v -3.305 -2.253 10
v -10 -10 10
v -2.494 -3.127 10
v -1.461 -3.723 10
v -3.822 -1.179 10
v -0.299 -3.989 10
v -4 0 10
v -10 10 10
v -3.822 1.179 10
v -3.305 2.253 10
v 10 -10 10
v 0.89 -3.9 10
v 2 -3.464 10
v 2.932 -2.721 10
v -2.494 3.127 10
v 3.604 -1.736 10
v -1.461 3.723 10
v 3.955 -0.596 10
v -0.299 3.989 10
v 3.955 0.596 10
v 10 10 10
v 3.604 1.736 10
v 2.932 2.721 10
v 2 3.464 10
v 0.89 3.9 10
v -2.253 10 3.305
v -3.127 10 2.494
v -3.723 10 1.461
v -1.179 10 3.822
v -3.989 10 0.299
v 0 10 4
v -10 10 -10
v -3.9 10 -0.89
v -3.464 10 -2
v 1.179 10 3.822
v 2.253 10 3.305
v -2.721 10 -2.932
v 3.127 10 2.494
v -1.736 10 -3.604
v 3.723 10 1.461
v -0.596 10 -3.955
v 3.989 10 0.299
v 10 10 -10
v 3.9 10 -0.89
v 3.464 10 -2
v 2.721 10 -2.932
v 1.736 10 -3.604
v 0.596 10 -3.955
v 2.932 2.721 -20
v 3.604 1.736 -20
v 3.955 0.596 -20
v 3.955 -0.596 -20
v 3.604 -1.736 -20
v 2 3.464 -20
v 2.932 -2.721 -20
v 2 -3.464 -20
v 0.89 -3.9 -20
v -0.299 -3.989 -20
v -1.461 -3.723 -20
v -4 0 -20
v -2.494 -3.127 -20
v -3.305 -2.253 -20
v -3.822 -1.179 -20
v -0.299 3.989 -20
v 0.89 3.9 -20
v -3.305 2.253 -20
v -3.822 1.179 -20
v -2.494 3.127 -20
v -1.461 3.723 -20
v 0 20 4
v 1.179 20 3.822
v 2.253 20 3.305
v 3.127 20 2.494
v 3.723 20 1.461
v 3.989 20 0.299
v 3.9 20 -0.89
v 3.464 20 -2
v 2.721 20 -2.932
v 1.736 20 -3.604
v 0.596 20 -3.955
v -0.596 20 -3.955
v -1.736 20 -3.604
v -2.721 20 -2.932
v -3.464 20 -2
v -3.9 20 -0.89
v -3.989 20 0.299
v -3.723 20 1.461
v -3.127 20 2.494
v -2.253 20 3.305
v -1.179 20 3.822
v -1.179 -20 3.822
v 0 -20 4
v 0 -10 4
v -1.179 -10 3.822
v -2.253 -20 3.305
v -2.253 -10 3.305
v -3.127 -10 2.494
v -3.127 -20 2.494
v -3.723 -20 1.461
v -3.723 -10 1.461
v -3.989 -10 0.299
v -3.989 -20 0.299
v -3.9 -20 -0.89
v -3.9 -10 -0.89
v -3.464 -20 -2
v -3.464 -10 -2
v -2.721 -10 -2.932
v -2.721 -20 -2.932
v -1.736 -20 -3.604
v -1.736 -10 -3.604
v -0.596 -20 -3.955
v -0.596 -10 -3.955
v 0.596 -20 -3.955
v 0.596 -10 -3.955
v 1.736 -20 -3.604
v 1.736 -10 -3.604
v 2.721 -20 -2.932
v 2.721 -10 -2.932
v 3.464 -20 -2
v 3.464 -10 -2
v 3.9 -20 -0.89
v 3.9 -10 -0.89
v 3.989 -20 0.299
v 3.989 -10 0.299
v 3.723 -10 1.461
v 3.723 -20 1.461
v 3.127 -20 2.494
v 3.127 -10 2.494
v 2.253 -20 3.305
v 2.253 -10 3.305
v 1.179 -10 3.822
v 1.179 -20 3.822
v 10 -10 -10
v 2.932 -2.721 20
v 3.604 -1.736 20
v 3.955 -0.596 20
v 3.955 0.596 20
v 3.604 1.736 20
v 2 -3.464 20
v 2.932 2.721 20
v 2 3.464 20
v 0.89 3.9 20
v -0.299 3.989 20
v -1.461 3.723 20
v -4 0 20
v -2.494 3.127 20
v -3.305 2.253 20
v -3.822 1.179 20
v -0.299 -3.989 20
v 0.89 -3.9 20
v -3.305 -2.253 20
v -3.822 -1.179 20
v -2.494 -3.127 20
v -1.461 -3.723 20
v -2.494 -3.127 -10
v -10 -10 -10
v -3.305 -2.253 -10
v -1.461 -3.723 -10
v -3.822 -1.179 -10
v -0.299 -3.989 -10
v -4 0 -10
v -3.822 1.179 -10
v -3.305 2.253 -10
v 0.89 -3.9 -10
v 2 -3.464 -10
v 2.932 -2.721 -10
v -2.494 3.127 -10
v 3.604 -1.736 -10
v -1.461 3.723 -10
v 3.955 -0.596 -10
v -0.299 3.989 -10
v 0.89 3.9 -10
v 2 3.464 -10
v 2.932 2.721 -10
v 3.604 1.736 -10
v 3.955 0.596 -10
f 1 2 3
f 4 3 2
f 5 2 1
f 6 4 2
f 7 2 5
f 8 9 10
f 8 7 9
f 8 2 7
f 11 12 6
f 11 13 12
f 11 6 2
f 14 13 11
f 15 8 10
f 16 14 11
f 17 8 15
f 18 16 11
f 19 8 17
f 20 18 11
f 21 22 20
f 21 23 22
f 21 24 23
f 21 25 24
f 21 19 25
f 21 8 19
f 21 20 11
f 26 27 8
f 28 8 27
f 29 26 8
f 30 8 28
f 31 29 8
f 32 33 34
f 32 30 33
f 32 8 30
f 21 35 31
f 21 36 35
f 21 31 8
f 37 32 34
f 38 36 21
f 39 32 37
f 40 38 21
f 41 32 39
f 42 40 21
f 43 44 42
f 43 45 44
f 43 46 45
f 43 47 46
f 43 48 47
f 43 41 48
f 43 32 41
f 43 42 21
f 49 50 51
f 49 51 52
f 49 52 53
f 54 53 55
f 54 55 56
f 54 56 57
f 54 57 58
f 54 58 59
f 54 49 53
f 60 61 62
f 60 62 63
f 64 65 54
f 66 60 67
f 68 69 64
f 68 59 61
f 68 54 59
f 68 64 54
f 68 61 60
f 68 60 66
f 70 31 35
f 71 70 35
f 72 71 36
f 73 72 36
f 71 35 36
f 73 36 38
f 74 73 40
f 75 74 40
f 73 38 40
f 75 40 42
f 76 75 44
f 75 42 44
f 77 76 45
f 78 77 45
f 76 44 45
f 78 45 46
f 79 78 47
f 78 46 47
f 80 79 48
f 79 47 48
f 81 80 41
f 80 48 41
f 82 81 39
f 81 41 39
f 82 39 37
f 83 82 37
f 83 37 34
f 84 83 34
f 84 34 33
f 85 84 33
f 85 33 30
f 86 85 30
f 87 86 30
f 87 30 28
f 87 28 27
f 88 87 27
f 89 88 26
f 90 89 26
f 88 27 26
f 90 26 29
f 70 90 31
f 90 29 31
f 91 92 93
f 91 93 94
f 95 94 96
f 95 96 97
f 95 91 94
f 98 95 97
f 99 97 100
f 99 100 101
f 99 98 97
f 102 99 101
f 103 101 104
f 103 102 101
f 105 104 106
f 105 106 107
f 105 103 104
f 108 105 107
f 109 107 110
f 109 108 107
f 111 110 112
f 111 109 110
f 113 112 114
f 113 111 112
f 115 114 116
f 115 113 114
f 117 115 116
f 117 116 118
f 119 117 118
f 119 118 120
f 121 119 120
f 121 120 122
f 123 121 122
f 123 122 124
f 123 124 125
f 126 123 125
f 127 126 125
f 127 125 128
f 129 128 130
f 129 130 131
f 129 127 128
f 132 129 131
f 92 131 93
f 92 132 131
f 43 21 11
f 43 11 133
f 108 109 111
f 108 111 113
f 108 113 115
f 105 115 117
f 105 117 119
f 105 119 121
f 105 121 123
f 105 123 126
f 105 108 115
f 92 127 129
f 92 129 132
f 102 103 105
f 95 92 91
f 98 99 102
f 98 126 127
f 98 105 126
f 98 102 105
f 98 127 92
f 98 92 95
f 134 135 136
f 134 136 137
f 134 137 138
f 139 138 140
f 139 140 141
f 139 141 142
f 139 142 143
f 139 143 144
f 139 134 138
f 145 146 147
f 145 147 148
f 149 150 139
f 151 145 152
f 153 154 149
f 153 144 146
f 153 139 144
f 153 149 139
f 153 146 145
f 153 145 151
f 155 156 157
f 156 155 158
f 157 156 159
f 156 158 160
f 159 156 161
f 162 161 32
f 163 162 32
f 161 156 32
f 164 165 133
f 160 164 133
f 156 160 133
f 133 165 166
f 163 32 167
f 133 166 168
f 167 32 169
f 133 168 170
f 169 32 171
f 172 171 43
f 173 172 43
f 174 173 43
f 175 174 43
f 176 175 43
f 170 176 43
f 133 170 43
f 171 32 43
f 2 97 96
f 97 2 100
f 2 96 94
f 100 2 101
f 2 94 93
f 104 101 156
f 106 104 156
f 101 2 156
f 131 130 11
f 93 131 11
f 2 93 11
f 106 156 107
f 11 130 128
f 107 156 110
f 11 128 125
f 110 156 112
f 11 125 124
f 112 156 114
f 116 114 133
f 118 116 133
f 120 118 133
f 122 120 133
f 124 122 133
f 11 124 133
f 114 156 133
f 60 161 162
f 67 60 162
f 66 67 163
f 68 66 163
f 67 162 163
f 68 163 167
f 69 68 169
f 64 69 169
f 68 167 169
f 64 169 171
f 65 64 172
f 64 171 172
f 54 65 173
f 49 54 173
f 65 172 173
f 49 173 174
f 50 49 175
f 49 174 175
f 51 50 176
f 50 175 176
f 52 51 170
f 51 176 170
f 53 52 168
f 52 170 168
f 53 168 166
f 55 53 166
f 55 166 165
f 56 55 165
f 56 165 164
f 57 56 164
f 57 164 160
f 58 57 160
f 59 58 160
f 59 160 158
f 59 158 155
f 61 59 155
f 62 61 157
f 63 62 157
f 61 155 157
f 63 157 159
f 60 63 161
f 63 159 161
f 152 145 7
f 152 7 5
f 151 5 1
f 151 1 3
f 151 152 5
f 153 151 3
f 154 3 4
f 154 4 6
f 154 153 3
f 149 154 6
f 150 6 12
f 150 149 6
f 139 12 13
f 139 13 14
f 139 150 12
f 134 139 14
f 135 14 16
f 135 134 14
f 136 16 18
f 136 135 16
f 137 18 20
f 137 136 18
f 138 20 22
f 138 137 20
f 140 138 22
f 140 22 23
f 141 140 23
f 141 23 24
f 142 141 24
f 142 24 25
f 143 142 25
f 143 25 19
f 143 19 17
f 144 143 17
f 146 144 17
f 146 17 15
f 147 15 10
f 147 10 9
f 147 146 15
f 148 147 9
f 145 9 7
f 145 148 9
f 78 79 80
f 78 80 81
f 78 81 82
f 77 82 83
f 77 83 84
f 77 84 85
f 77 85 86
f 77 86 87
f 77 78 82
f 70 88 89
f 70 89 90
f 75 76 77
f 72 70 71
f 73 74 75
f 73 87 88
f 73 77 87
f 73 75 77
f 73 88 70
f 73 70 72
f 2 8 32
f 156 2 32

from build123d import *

# Parameters (mm, degrees)
SKETCH2_W           = 20
SKETCH2_H           = 20
BOSS_EXTRUDE1_DEPTH = 10
SKETCH5_R           = 4
BOSS_EXTRUDE2_DEPTH = 10
SKETCH3_R           = 4
BOSS_EXTRUDE3_DEPTH = 10
BOSS_EXTRUDE4_START = 10
SKETCH6_R           = 4
BOSS_EXTRUDE4_DEPTH = 10
BOSS_EXTRUDE5_START = 10
SKETCH4_R           = 4
BOSS_EXTRUDE5_DEPTH = 10


with BuildPart() as part:
    # Sketch2 → Boss-Extrude1 (new, symmetric)
    with BuildSketch(Plane(origin=(0, 0, 0), x_dir=(1, 0, 0), z_dir=(0, 1, 0))):
        Rectangle(SKETCH2_W, SKETCH2_H)
    extrude(amount=BOSS_EXTRUDE1_DEPTH, both=True)

    # Sketch5 → Boss-Extrude2 (add)
    with BuildSketch(Plane(origin=(0, 0, -10), x_dir=(-1, 0, 0), z_dir=(0, 0, -1))):
        Circle(SKETCH5_R)
    extrude(amount=BOSS_EXTRUDE2_DEPTH)

    # Sketch3 → Boss-Extrude3 (add)
    with BuildSketch(Plane(origin=(0, 10, 0), x_dir=(1, 0, 0), z_dir=(0, 1, 0))):
        with Locations(Location((0, 0, 0), (0, 0, 270))):
            Circle(SKETCH3_R)
    extrude(amount=BOSS_EXTRUDE3_DEPTH)

    # Sketch6 → Boss-Extrude4 (add)
    with BuildSketch(Plane.XY.offset(10).offset(BOSS_EXTRUDE4_START)):
        with Locations(Location((0, 0, 0), (0, 0, 180))):
            Circle(SKETCH6_R)
    extrude(amount=-BOSS_EXTRUDE4_DEPTH)

    # Sketch4 → Boss-Extrude5 (add)
    with BuildSketch(Plane.XZ.offset(10).offset(BOSS_EXTRUDE5_START)):
        with Locations(Location((0, 0, 0), (0, 0, 90))):
            Circle(SKETCH4_R)
    extrude(amount=-BOSS_EXTRUDE5_DEPTH)


solid = part.part
